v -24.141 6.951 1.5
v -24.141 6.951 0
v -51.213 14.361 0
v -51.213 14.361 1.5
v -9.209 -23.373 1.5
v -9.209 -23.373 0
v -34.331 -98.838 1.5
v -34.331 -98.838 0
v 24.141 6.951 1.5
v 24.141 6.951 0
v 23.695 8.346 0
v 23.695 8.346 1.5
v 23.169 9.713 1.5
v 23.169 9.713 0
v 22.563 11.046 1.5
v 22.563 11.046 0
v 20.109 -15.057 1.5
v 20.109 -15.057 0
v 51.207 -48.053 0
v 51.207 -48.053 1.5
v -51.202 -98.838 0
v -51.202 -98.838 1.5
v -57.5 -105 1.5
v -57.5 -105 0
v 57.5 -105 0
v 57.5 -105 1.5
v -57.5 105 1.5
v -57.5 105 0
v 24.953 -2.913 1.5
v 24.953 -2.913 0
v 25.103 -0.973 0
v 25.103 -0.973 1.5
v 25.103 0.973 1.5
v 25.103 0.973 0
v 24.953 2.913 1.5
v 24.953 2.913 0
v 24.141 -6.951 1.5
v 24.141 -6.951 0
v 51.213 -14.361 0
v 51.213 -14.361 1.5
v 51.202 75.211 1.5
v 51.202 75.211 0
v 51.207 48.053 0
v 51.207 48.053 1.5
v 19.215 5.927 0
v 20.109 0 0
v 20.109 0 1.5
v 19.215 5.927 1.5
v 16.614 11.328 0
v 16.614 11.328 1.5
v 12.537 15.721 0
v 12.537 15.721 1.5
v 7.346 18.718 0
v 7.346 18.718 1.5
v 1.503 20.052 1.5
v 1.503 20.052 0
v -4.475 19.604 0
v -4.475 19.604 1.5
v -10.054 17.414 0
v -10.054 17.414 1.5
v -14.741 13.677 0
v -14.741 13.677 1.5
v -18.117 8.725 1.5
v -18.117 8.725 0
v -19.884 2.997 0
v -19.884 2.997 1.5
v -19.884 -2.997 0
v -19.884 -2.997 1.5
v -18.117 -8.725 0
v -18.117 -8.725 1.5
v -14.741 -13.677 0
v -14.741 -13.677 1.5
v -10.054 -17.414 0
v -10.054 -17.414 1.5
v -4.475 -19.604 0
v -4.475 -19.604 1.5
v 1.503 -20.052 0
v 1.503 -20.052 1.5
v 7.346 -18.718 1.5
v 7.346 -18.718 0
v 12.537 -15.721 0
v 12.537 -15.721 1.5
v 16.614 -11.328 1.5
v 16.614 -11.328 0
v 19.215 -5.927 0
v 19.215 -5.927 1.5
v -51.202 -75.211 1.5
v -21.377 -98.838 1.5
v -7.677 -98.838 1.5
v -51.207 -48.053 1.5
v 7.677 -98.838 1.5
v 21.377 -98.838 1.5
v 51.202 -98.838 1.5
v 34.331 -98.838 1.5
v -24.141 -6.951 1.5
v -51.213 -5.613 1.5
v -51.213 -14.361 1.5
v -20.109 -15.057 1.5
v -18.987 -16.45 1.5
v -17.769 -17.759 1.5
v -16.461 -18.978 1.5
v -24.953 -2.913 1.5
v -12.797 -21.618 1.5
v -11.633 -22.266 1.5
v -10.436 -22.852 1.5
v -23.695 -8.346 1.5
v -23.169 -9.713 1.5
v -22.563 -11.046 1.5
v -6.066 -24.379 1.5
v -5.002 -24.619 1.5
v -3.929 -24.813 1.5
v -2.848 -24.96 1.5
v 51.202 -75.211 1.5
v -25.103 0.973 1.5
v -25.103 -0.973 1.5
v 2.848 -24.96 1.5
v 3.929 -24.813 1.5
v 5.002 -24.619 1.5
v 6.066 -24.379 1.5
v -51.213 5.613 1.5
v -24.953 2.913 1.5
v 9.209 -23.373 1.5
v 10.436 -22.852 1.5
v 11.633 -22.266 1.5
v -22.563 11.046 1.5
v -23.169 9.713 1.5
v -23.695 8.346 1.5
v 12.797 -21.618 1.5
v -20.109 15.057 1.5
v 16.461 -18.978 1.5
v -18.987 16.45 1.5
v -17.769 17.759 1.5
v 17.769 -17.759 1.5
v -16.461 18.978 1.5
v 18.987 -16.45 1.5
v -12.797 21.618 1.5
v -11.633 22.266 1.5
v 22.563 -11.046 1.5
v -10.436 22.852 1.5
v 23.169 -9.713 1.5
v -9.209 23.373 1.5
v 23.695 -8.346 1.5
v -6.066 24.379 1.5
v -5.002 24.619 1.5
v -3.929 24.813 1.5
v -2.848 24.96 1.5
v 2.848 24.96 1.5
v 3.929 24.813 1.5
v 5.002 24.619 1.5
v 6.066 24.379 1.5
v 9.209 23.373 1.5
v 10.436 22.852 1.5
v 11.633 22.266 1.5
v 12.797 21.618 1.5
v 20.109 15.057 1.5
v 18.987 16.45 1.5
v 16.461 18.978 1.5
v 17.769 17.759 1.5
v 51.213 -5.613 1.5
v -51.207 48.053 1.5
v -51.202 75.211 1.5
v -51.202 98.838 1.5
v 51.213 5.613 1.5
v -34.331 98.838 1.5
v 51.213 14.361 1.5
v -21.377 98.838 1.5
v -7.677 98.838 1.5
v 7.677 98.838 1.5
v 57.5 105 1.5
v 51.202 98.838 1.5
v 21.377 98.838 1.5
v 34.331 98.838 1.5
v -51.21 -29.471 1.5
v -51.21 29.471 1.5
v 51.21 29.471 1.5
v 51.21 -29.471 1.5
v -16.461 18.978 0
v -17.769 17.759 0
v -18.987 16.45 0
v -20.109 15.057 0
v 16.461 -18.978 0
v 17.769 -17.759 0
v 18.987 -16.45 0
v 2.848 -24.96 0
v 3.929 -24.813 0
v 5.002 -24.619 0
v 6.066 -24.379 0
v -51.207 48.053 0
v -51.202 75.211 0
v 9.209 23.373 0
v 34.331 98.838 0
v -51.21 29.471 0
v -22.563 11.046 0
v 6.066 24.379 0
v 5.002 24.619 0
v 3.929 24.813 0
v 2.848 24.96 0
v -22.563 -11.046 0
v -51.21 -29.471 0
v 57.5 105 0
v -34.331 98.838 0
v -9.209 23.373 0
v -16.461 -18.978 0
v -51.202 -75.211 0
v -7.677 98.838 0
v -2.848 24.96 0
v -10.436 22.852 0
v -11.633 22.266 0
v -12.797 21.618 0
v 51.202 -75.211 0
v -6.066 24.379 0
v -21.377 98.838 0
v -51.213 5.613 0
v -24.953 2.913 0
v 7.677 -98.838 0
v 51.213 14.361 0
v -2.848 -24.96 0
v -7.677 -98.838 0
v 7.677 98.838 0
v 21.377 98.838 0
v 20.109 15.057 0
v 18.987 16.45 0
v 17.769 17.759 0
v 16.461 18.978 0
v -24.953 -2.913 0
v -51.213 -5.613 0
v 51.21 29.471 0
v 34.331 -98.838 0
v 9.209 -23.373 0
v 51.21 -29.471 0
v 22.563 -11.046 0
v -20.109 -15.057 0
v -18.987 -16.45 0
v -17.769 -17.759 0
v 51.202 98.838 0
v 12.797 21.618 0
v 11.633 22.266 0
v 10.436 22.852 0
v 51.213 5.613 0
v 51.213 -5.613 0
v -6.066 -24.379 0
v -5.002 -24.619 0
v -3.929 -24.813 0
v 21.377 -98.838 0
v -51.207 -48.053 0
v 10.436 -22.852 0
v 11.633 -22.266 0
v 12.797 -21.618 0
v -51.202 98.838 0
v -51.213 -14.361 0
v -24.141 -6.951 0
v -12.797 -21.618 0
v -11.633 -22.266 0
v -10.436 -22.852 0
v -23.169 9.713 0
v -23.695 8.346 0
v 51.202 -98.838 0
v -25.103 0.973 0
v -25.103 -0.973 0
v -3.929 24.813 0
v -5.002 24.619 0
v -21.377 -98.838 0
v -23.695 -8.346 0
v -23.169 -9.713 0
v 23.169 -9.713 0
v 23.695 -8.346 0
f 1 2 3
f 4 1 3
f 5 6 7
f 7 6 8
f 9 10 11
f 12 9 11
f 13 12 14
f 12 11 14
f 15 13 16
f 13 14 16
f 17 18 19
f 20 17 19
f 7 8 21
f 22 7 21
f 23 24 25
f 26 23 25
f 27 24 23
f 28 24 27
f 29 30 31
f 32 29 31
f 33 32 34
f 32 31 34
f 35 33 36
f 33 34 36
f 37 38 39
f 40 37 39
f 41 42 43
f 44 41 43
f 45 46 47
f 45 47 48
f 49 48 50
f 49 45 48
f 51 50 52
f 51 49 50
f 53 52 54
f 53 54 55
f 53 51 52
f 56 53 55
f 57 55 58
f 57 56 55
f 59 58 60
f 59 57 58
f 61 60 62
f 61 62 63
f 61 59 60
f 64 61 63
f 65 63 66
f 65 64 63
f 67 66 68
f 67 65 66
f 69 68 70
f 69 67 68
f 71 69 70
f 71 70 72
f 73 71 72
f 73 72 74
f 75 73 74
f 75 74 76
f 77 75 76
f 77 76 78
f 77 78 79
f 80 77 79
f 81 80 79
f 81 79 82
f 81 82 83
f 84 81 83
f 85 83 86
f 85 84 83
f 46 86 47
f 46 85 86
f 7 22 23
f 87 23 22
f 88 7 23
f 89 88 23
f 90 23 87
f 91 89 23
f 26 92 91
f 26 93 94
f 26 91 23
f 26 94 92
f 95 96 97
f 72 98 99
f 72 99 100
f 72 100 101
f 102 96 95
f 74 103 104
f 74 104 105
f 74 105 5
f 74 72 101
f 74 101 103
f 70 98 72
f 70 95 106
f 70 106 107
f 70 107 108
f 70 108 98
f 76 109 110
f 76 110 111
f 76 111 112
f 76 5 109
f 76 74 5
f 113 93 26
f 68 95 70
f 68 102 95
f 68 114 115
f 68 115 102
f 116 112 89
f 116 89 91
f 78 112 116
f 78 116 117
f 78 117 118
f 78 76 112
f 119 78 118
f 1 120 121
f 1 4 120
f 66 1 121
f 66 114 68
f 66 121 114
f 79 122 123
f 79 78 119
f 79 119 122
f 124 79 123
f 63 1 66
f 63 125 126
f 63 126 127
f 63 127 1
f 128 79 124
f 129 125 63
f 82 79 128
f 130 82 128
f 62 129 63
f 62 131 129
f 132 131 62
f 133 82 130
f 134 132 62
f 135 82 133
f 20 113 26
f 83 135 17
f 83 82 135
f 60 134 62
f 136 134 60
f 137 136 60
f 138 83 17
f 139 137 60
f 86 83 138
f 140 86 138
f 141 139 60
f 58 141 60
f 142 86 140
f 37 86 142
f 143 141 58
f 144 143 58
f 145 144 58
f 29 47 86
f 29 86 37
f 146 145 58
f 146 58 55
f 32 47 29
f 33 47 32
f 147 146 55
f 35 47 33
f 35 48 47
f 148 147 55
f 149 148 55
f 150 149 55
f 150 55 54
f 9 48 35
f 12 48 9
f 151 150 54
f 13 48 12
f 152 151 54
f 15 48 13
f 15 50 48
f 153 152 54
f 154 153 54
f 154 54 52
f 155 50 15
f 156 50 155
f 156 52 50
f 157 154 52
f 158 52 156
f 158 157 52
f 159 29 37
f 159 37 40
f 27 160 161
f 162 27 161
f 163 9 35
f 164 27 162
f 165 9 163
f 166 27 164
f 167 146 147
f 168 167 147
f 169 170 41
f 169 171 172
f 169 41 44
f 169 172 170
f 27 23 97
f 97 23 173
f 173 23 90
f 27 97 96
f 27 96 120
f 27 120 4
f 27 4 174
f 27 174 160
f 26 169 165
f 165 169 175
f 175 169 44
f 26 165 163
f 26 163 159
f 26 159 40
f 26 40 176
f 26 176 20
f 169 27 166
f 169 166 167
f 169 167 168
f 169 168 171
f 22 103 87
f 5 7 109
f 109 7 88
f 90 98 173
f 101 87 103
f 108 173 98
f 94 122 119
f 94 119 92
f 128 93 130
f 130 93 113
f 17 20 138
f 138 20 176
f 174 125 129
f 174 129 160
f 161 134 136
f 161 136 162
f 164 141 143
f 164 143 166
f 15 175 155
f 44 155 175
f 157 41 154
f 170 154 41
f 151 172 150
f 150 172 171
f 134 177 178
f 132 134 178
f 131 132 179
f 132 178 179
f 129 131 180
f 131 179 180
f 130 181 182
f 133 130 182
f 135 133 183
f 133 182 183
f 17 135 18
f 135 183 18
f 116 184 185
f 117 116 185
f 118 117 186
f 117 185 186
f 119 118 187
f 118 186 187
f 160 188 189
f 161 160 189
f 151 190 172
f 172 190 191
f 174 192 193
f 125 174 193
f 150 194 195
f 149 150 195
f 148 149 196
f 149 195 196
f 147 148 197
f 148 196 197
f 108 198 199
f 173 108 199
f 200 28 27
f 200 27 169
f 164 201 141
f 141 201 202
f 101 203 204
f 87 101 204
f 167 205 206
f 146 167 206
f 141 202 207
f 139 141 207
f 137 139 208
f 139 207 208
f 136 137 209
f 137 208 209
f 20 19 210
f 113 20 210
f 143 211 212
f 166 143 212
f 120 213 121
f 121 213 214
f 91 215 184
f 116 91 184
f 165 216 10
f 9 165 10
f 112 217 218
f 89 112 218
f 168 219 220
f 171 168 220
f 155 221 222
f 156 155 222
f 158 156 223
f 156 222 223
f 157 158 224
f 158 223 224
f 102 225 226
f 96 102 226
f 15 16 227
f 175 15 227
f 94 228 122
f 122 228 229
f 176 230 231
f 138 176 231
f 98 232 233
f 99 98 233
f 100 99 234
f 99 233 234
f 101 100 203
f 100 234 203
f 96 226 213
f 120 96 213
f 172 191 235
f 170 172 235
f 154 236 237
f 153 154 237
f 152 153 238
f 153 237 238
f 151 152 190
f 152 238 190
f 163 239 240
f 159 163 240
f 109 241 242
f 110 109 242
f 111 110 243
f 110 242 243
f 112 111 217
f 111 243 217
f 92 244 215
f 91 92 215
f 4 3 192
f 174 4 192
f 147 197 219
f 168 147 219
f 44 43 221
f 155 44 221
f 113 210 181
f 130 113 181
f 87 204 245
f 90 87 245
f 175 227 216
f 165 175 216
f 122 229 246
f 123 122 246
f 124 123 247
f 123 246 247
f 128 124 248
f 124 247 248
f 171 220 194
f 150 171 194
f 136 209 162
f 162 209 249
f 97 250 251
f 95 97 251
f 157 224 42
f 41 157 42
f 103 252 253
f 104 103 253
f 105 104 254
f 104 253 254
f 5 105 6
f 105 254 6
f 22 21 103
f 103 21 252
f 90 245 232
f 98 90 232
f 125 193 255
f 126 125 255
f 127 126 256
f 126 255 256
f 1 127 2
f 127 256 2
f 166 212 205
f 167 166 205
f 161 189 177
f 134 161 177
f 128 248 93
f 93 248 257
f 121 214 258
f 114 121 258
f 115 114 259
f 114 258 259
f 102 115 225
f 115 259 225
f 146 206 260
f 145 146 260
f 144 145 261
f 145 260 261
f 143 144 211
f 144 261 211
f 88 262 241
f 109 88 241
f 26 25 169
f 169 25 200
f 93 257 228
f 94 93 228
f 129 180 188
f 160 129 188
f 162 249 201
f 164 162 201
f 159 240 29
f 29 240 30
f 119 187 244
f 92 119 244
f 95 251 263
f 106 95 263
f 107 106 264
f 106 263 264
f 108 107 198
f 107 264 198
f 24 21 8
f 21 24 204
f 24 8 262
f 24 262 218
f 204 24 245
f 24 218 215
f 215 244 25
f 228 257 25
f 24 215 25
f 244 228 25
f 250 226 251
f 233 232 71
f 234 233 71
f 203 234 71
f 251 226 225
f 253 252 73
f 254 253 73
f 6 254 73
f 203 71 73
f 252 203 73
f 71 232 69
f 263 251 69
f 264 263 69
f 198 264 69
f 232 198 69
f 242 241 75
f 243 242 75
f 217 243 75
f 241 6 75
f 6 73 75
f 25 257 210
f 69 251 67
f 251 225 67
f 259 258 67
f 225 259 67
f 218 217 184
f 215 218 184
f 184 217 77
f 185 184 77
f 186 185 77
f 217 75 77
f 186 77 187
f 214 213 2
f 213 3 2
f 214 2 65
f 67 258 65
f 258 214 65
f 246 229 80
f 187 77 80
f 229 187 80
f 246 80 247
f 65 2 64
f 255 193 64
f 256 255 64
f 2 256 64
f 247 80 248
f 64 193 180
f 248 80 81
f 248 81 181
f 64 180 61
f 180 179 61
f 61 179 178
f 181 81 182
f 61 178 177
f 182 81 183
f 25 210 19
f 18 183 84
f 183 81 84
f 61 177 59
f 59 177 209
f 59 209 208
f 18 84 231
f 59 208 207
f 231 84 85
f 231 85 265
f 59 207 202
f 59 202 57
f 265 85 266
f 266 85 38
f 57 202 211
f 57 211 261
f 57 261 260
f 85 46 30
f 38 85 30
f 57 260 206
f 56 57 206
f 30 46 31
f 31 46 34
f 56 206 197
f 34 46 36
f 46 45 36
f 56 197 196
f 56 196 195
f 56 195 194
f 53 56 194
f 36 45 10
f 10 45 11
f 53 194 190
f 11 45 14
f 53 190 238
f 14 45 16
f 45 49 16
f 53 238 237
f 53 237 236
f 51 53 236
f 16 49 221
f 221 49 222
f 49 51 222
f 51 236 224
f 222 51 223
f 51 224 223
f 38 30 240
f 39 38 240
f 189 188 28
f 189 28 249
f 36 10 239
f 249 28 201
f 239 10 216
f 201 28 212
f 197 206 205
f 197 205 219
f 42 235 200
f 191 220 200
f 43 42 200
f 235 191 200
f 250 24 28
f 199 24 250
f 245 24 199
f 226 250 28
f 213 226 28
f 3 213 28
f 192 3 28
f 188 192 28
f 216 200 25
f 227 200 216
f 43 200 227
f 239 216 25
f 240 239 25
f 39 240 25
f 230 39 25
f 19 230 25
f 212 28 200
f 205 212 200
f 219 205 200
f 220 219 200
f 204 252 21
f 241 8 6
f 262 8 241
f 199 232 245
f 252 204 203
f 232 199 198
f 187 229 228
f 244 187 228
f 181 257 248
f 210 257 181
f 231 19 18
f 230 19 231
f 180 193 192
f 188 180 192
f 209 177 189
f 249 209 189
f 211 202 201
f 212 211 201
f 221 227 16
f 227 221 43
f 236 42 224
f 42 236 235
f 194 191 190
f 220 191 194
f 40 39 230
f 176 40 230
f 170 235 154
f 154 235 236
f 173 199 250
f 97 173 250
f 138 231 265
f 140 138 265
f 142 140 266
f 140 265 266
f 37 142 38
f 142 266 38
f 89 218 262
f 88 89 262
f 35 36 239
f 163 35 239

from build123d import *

# Parameters (mm, degrees)
F0_W     = 115
F0_H     = 210
F0_R     = 20.108519
F1_DEPTH = 1.5


with BuildPart() as f1:
    # F0 (on Top) → F1 (new body)
    with BuildSketch(Plane.XY):
        Rectangle(F0_W, F0_H)
        with BuildLine():
            Line((-51.202005, -98.838247), (-12.797066, -21.618334))
            ThreePointArc((-12.797066, -21.618334), (-11.038136, -22.567162), (-9.209351, -23.373171))
            Line((-9.209351, -23.373171), (-34.33051, -98.838247))
            Line((-34.33051, -98.838247), (-51.202005, -98.838247))
        make_face(mode=Mode.SUBTRACT)
        with BuildLine():
            Line((-21.377223, -98.838247), (-6.066496, -24.378574))
            ThreePointArc((-6.066496, -24.378574), (-4.466784, -24.721754), (-2.848126, -24.960077))
            Line((-2.848126, -24.960077), (-7.67663, -98.838247))
            Line((-7.67663, -98.838247), (-21.377223, -98.838247))
        make_face(mode=Mode.SUBTRACT)
        with BuildLine():
            ThreePointArc((-20.109431, -15.057491), (-18.389989, -17.115068), (-16.461037, -18.977659))
            Line((-16.461037, -18.977659), (-51.202005, -75.210557))
            Line((-51.202005, -75.210557), (-51.207021, -48.053044))
            Line((-51.207021, -48.053044), (-20.109431, -15.057491))
        make_face(mode=Mode.SUBTRACT)
        with BuildLine():
            ThreePointArc((-24.141339, -6.950756), (-23.441886, -9.033009), (-22.563215, -11.046202))
            Line((-22.563215, -11.046202), (-51.210452, -29.471497))
            Line((-51.210452, -29.471497), (-51.213243, -14.361147))
            Line((-51.213243, -14.361147), (-24.141339, -6.950756))
        make_face(mode=Mode.SUBTRACT)
        with BuildLine():
            Line((7.67663, -98.838247), (2.848126, -24.960077))
            ThreePointArc((2.848126, -24.960077), (4.466784, -24.721754), (6.066496, -24.378574))
            Line((6.066496, -24.378574), (21.377223, -98.838247))
            Line((21.377223, -98.838247), (7.67663, -98.838247))
        make_face(mode=Mode.SUBTRACT)
        with BuildLine():
            Line((34.33051, -98.838247), (9.209351, -23.373171))
            ThreePointArc((9.209351, -23.373171), (11.038136, -22.567162), (12.797066, -21.618334))
            Line((12.797066, -21.618334), (51.202005, -98.838247))
            Line((51.202005, -98.838247), (34.33051, -98.838247))
        make_face(mode=Mode.SUBTRACT)
        with BuildLine():
            Line((51.202005, -75.210557), (16.461037, -18.977659))
            ThreePointArc((16.461037, -18.977659), (18.389989, -17.115068), (20.109431, -15.057491))
            Line((20.109431, -15.057491), (51.207021, -48.053044))
            Line((51.207021, -48.053044), (51.202005, -75.210557))
        make_face(mode=Mode.SUBTRACT)
        with BuildLine():
            Line((51.210452, -29.471497), (22.563215, -11.046202))
            ThreePointArc((22.563215, -11.046202), (23.441886, -9.033009), (24.141339, -6.950756))
            Line((24.141339, -6.950756), (51.213243, -14.361147))
            Line((51.213243, -14.361147), (51.210452, -29.471497))
        make_face(mode=Mode.SUBTRACT)
        with BuildLine():
            ThreePointArc((-24.952535, 2.91346), (-25.122047, 0), (-24.952535, -2.91346))
            Line((-24.952535, -2.91346), (-51.213243, -5.612732))
            Line((-51.213243, -5.612732), (-51.213243, 5.612732))
            Line((-51.213243, 5.612732), (-24.952535, 2.91346))
        make_face(mode=Mode.SUBTRACT)
        with BuildLine():
            Line((-51.210452, 29.471497), (-22.563215, 11.046202))
            ThreePointArc((-22.563215, 11.046202), (-23.441886, 9.033009), (-24.141339, 6.950756))
            Line((-24.141339, 6.950756), (-51.213243, 14.361147))
            Line((-51.213243, 14.361147), (-51.210452, 29.471497))
        make_face(mode=Mode.SUBTRACT)
        with BuildLine():
            Line((-51.202005, 75.210557), (-16.461037, 18.977659))
            ThreePointArc((-16.461037, 18.977659), (-18.389989, 17.115068), (-20.109431, 15.057491))
            Line((-20.109431, 15.057491), (-51.207021, 48.053044))
            Line((-51.207021, 48.053044), (-51.202005, 75.210557))
        make_face(mode=Mode.SUBTRACT)
        with BuildLine():
            Line((-34.33051, 98.838247), (-9.209351, 23.373171))
            ThreePointArc((-9.209351, 23.373171), (-11.038136, 22.567162), (-12.797066, 21.618334))
            Line((-12.797066, 21.618334), (-51.202005, 98.838247))
            Line((-51.202005, 98.838247), (-34.33051, 98.838247))
        make_face(mode=Mode.SUBTRACT)
        with BuildLine():
            Line((-7.67663, 98.838247), (-2.848126, 24.960077))
            ThreePointArc((-2.848126, 24.960077), (-4.466784, 24.721754), (-6.066496, 24.378574))
            Line((-6.066496, 24.378574), (-21.377223, 98.838247))
            Line((-21.377223, 98.838247), (-7.67663, 98.838247))
        make_face(mode=Mode.SUBTRACT)
        Circle(F0_R, mode=Mode.SUBTRACT)
        with BuildLine():
            ThreePointArc((24.952535, -2.91346), (25.122047, 0), (24.952535, 2.91346))
            Line((24.952535, 2.91346), (51.213243, 5.612732))
            Line((51.213243, 5.612732), (51.213243, -5.612732))
            Line((51.213243, -5.612732), (24.952535, -2.91346))
        make_face(mode=Mode.SUBTRACT)
        with BuildLine():
            ThreePointArc((24.141339, 6.950756), (23.441886, 9.033009), (22.563215, 11.046202))
            Line((22.563215, 11.046202), (51.210452, 29.471497))
            Line((51.210452, 29.471497), (51.213243, 14.361147))
            Line((51.213243, 14.361147), (24.141339, 6.950756))
        make_face(mode=Mode.SUBTRACT)
        with BuildLine():
            ThreePointArc((20.109431, 15.057491), (18.389989, 17.115068), (16.461037, 18.977659))
            Line((16.461037, 18.977659), (51.202005, 75.210557))
            Line((51.202005, 75.210557), (51.207021, 48.053044))
            Line((51.207021, 48.053044), (20.109431, 15.057491))
        make_face(mode=Mode.SUBTRACT)
        with BuildLine():
            ThreePointArc((6.066496, 24.378574), (4.466784, 24.721754), (2.848126, 24.960077))
            Line((2.848126, 24.960077), (7.67663, 98.838247))
            Line((7.67663, 98.838247), (21.377223, 98.838247))
            Line((21.377223, 98.838247), (6.066496, 24.378574))
        make_face(mode=Mode.SUBTRACT)
        with BuildLine():
            ThreePointArc((12.797066, 21.618334), (11.038136, 22.567162), (9.209351, 23.373171))
            Line((9.209351, 23.373171), (34.33051, 98.838247))
            Line((34.33051, 98.838247), (51.202005, 98.838247))
            Line((51.202005, 98.838247), (12.797066, 21.618334))
        make_face(mode=Mode.SUBTRACT)
    extrude(amount=F1_DEPTH)


solid = f1.part
